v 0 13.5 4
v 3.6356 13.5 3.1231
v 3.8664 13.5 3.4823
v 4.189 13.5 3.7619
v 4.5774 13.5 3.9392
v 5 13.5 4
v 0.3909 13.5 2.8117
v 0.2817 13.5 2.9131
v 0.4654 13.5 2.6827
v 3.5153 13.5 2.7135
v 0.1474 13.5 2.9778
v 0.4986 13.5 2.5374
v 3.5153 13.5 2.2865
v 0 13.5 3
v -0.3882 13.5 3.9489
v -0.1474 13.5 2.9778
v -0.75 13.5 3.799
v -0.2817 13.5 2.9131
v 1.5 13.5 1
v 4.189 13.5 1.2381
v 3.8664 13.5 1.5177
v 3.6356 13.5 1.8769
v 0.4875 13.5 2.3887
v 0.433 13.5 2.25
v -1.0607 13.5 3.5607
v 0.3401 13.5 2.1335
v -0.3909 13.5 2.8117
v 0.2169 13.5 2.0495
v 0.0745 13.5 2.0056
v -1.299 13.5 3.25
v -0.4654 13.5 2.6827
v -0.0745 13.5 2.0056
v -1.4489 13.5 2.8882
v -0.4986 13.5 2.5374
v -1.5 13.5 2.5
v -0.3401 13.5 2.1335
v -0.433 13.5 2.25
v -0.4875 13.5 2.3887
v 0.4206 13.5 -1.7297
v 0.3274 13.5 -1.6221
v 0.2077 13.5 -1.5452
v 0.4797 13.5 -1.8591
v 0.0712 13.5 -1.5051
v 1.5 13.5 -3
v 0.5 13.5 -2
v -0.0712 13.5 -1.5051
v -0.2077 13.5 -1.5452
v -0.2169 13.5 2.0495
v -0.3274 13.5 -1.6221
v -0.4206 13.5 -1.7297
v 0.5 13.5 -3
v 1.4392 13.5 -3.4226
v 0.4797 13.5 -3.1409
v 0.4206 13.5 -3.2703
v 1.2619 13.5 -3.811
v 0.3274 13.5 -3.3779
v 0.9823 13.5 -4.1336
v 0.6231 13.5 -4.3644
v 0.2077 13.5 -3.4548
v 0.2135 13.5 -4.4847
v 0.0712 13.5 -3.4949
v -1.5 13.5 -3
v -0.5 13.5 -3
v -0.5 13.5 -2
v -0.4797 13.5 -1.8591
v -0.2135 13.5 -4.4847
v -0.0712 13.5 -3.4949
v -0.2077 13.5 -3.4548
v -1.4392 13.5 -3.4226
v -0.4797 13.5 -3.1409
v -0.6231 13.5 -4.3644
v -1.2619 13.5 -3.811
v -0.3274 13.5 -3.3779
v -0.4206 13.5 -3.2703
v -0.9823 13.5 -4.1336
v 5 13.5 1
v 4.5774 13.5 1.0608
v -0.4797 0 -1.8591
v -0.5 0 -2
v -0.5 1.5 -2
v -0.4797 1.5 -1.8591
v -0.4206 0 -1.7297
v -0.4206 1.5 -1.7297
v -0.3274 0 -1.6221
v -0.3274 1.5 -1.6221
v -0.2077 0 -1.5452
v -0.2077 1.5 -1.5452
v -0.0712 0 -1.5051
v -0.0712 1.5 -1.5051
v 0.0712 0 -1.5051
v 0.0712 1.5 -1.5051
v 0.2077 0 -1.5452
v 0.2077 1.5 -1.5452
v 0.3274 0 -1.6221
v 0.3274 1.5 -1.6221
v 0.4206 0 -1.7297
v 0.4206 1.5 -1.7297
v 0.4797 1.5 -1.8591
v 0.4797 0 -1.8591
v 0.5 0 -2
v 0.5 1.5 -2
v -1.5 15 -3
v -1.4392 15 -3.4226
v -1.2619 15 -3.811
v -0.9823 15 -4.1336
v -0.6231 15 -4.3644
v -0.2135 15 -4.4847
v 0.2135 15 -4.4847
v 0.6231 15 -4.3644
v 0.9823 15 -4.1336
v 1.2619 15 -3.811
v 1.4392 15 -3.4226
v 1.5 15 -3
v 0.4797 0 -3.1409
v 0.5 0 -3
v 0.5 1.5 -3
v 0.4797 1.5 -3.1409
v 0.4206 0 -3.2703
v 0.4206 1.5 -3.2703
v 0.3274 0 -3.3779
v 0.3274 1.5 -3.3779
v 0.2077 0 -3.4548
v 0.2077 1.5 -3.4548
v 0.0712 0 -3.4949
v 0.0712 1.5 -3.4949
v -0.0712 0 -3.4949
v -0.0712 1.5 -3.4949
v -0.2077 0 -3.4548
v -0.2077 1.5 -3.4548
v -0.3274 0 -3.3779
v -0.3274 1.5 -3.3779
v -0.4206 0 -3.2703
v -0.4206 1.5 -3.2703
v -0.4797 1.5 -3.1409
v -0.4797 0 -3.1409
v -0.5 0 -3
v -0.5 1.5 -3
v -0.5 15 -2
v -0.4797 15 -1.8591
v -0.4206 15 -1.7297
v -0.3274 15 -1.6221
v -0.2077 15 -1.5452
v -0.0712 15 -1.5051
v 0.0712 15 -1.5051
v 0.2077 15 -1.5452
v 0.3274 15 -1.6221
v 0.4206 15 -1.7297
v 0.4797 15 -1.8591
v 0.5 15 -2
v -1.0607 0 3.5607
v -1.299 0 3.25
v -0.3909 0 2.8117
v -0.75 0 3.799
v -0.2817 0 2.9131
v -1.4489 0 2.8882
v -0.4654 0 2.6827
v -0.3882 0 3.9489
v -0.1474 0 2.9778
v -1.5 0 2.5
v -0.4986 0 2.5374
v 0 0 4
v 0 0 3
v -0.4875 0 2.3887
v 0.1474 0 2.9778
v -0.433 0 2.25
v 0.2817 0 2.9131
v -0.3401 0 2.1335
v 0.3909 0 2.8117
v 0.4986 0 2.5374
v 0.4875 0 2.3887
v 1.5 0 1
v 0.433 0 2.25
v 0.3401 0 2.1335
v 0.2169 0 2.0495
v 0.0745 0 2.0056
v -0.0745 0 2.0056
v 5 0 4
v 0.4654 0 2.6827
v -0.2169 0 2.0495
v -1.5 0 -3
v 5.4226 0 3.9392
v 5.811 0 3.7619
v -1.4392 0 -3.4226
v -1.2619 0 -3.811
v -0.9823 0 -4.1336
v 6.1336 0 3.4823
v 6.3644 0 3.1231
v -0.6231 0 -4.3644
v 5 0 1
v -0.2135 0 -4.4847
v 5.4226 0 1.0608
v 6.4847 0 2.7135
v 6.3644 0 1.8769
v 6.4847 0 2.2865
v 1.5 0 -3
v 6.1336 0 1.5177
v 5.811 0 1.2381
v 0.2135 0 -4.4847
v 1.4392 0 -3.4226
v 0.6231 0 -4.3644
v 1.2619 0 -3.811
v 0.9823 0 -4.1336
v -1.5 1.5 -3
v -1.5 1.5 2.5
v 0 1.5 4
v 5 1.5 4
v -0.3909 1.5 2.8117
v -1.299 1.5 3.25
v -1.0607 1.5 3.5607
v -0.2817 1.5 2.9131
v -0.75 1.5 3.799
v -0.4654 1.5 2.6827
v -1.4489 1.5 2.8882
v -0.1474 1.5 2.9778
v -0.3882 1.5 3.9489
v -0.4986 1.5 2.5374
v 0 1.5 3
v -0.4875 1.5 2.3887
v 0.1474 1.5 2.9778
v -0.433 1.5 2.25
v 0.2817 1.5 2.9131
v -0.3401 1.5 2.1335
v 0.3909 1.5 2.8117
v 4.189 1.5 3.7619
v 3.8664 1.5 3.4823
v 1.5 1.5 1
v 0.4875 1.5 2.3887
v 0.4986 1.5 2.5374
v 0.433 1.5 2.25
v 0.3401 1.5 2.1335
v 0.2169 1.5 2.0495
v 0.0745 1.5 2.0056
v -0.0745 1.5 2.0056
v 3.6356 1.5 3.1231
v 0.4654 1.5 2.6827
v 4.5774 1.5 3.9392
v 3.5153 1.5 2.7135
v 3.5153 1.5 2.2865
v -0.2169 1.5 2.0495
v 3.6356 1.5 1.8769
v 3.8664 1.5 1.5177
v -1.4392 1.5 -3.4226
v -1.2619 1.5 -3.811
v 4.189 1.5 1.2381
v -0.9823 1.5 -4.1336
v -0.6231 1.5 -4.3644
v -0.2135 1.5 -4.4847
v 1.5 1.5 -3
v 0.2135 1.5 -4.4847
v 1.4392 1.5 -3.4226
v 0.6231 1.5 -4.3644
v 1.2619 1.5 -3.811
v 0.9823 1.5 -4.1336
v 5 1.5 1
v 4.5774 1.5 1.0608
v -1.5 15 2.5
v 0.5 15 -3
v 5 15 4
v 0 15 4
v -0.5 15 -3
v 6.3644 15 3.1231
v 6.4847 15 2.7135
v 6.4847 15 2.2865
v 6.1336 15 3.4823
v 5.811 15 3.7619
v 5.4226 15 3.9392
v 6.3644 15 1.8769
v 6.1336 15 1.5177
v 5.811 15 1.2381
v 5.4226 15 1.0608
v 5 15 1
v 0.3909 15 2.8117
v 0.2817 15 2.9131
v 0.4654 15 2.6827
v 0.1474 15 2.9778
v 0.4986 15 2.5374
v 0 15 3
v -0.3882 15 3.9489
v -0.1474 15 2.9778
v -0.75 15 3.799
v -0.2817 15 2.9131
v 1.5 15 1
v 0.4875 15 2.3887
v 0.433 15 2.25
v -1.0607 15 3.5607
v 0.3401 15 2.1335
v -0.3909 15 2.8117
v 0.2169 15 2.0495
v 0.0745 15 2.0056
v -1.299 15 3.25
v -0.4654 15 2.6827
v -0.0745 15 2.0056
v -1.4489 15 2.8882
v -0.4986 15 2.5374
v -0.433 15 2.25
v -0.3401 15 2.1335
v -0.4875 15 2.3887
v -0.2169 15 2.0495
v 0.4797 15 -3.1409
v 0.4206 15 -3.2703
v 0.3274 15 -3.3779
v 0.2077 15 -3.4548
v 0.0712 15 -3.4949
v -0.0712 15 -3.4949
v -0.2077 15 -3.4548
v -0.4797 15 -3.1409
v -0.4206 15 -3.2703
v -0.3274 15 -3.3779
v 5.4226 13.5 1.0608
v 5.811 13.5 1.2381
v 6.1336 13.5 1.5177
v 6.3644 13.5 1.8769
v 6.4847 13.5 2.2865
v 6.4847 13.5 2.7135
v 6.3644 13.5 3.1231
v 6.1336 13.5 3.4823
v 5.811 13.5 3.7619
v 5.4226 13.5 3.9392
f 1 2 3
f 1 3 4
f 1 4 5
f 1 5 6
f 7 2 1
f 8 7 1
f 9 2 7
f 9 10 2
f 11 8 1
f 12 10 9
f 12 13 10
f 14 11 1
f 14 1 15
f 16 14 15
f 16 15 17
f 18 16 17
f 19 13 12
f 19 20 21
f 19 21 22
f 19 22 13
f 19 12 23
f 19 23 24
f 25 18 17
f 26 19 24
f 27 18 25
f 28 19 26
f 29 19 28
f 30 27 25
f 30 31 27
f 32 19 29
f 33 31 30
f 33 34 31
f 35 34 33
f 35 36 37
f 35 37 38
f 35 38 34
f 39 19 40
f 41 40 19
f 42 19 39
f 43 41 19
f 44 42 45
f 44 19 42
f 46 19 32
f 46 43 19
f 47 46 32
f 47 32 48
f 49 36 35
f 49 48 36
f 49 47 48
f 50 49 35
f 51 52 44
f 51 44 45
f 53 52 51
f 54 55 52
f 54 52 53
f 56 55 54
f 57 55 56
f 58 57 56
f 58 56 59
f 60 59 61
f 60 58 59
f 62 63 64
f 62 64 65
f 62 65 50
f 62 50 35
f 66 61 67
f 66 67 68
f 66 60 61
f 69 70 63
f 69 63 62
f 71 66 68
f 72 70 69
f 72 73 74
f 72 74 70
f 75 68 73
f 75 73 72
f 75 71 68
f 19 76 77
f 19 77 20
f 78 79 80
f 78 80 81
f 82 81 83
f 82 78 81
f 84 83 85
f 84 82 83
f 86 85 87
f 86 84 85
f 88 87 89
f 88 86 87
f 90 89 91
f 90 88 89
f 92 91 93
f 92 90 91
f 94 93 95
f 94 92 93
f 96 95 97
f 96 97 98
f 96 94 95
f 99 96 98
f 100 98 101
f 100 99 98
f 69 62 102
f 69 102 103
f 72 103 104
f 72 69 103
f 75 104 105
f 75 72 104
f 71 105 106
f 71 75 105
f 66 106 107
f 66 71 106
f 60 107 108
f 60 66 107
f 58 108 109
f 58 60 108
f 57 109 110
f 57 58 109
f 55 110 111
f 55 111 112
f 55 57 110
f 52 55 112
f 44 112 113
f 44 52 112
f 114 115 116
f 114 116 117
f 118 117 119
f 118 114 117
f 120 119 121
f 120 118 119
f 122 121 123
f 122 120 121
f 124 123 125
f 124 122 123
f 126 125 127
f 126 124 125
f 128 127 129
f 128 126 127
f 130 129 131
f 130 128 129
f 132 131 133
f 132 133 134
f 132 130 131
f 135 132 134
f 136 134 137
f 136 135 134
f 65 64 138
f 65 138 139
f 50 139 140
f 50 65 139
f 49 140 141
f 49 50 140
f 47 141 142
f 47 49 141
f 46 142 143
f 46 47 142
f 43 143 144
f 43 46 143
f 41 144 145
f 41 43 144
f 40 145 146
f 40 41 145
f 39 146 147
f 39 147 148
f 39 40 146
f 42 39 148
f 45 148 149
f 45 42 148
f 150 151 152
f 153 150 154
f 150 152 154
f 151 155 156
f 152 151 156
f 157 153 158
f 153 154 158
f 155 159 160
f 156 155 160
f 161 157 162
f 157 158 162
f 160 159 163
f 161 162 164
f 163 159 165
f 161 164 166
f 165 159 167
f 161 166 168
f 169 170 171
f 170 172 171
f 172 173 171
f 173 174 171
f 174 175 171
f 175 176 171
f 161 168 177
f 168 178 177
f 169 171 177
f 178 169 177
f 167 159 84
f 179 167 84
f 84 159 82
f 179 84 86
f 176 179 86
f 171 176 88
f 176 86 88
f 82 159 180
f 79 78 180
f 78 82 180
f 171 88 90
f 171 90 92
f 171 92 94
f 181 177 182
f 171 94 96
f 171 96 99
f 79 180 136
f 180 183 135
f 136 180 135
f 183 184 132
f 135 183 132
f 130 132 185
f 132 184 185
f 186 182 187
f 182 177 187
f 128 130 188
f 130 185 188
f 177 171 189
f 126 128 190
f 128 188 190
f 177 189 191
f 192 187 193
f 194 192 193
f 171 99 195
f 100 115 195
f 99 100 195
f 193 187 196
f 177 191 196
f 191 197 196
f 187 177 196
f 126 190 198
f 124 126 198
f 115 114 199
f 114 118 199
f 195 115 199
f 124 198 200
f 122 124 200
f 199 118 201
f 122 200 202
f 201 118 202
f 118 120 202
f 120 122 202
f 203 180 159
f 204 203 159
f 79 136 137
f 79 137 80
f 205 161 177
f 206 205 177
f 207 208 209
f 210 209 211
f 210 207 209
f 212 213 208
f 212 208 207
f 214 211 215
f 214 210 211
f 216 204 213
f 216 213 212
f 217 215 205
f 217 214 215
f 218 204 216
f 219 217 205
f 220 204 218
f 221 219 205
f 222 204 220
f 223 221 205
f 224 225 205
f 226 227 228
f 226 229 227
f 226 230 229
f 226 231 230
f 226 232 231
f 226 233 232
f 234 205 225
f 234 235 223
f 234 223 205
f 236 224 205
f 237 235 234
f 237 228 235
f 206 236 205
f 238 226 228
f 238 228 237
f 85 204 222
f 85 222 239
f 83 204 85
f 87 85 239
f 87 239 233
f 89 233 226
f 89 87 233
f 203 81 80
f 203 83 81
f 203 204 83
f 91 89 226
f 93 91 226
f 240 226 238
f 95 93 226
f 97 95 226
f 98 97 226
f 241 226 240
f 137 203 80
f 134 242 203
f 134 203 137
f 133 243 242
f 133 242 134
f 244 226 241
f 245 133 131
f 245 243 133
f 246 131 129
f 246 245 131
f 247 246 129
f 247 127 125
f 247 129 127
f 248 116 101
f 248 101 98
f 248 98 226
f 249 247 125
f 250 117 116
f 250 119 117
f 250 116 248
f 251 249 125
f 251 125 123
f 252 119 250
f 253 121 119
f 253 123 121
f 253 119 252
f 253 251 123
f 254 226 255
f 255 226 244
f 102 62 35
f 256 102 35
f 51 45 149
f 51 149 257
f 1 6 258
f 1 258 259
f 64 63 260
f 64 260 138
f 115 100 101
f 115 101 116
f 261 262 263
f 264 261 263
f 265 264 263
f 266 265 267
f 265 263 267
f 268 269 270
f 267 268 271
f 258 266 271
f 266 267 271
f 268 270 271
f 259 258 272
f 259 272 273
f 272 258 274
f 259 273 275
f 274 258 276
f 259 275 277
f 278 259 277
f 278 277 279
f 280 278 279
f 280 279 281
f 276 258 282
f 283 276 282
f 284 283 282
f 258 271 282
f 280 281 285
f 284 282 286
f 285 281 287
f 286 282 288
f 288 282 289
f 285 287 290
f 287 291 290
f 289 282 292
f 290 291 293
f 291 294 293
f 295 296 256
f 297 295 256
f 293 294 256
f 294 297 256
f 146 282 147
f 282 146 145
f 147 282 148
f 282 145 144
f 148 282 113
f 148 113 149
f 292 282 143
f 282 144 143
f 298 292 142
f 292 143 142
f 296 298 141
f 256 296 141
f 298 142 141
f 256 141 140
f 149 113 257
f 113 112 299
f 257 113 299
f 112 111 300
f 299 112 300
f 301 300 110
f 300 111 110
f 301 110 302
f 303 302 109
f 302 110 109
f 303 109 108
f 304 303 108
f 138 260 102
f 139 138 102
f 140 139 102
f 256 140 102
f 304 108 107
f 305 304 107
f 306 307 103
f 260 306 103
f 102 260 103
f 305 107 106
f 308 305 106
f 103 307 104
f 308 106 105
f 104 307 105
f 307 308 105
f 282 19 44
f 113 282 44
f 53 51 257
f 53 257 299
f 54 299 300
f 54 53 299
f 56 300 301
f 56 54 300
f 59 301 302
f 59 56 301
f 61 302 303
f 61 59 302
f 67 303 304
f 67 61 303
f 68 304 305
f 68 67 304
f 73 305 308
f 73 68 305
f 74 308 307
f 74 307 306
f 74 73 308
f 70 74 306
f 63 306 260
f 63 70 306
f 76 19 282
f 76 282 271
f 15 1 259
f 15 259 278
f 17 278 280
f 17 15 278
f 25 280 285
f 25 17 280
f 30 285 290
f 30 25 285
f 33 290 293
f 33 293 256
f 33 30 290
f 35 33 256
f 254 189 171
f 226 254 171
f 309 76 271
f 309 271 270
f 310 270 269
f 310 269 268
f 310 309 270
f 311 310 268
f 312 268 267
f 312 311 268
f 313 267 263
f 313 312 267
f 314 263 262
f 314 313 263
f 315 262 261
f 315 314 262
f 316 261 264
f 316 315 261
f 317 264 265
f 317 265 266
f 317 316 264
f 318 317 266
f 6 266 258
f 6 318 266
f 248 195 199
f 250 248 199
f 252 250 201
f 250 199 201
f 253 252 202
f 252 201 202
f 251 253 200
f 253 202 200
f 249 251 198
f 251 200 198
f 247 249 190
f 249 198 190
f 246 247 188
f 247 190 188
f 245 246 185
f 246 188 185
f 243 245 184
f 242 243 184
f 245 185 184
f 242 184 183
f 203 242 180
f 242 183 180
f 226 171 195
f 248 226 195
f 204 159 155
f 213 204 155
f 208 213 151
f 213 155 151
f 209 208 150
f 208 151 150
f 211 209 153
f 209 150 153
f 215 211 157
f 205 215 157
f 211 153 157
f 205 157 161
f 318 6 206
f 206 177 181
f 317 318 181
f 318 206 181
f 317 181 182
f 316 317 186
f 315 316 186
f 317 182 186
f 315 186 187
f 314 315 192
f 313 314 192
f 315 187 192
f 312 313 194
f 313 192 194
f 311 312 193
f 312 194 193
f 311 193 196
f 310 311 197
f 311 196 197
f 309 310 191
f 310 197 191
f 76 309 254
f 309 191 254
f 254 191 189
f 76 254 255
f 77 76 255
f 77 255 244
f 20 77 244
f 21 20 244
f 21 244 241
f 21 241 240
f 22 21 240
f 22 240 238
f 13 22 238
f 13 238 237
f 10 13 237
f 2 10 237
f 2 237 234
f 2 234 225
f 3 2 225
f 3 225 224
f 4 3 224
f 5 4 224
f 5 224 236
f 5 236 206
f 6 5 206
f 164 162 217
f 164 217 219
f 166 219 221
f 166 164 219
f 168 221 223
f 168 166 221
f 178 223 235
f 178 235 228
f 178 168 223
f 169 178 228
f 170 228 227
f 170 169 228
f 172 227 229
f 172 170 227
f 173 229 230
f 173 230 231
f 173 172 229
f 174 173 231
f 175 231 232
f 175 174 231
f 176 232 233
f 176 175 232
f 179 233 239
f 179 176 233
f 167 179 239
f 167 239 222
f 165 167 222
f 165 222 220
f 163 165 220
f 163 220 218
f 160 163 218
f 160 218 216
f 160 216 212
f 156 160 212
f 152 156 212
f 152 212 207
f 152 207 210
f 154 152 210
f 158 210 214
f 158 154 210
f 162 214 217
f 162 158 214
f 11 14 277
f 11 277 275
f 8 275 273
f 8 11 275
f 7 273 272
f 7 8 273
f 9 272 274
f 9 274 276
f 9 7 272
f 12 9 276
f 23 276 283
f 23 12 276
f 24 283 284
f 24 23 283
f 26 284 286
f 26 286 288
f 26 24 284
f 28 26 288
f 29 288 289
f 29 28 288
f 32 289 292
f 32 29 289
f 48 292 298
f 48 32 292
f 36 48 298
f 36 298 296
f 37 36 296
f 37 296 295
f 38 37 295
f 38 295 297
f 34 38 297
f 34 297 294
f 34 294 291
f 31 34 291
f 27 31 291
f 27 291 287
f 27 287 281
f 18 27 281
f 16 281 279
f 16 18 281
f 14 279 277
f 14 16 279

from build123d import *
from build123d.topology import SkipClean

# Parameters (mm, degrees)
SKETCH1_R           = 0.5
BOSS_EXTRUDE1_DEPTH = 1.5
SKETCH2_R           = 1.5
BOSS_EXTRUDE2_DEPTH = 12
SKETCH3_R           = 0.5
BOSS_EXTRUDE3_DEPTH = 1.5


with BuildPart() as part:
    # Sketch1 → Boss-Extrude1 (new body)
    with BuildSketch(Plane(origin=(0, 0, 0), x_dir=(1, 0, 0), z_dir=(0, 1, 0))):
        with BuildLine():
            Line((5, -1), (1.5, -1))
            Line((1.5, -1), (1.5, 2.5))
            Line((1.5, 2.5), (1.5, 3))
            ThreePointArc((1.5, 3), (0, 4.5), (-1.5, 3))
            Line((-1.5, 3), (-1.5, 2.5))
            Line((-1.5, 2.5), (-1.5, -2.5))
            ThreePointArc((-1.5, -2.5), (-1.060660172, -3.560660172), (0, -4))
            Line((0, -4), (5, -4))
            ThreePointArc((5, -4), (6.5, -2.5), (5, -1))
        make_face()
        with Locations(Location((0, -2.5, 0), (0, 0, 270))):
            Circle(SKETCH1_R, mode=Mode.SUBTRACT)
        with BuildLine():
            Line((-0.5, 3), (-0.5, 2))
            ThreePointArc((-0.5, 2), (0, 1.5), (0.5, 2))
            Line((0.5, 2), (0.5, 3))
            ThreePointArc((0.5, 3), (0, 3.5), (-0.5, 3))
        make_face(mode=Mode.SUBTRACT)
    extrude(amount=BOSS_EXTRUDE1_DEPTH)

    # Sketch2 → Boss-Extrude2 (add)
    with BuildSketch(Plane(origin=(0, 1.5, 0), x_dir=(1, 0, 0), z_dir=(0, 1, 0))):
        with Locations(Location((5, -2.5, 0), (0, 0, 270))):
            Circle(SKETCH2_R)
    extrude(amount=BOSS_EXTRUDE2_DEPTH)

    # Sketch3 → Boss-Extrude3 (add)
    with SkipClean():  # the faces are left unmerged after this step: merging them gives an invalid solid
        with BuildSketch(Plane(origin=(0, 13.5, 0), x_dir=(1, 0, 0), z_dir=(0, 1, 0))):
            with BuildLine():
                Line((1.5, -1), (5, -1))
                ThreePointArc((5, -1), (6.5, -2.5), (5, -4))
                Line((5, -4), (0, -4))
                ThreePointArc((0, -4), (-1.060660172, -3.560660172), (-1.5, -2.5))
                Line((-1.5, -2.5), (-1.5, 2.5))
                Line((-1.5, 2.5), (-1.5, 3))
                ThreePointArc((-1.5, 3), (0, 4.5), (1.5, 3))
                Line((1.5, 3), (1.5, 2.5))
                Line((1.5, 2.5), (1.5, -1))
            make_face()
            with Locations(Location((0, -2.5, 0), (0, 0, 270))):
                Circle(SKETCH3_R, mode=Mode.SUBTRACT)
            with BuildLine():
                Line((-0.5, 3), (-0.5, 2))
                ThreePointArc((-0.5, 2), (0, 1.5), (0.5, 2))
                Line((0.5, 2), (0.5, 3))
                ThreePointArc((0.5, 3), (0, 3.5), (-0.5, 3))
            make_face(mode=Mode.SUBTRACT)
        extrude(amount=BOSS_EXTRUDE3_DEPTH)


solid = part.part
